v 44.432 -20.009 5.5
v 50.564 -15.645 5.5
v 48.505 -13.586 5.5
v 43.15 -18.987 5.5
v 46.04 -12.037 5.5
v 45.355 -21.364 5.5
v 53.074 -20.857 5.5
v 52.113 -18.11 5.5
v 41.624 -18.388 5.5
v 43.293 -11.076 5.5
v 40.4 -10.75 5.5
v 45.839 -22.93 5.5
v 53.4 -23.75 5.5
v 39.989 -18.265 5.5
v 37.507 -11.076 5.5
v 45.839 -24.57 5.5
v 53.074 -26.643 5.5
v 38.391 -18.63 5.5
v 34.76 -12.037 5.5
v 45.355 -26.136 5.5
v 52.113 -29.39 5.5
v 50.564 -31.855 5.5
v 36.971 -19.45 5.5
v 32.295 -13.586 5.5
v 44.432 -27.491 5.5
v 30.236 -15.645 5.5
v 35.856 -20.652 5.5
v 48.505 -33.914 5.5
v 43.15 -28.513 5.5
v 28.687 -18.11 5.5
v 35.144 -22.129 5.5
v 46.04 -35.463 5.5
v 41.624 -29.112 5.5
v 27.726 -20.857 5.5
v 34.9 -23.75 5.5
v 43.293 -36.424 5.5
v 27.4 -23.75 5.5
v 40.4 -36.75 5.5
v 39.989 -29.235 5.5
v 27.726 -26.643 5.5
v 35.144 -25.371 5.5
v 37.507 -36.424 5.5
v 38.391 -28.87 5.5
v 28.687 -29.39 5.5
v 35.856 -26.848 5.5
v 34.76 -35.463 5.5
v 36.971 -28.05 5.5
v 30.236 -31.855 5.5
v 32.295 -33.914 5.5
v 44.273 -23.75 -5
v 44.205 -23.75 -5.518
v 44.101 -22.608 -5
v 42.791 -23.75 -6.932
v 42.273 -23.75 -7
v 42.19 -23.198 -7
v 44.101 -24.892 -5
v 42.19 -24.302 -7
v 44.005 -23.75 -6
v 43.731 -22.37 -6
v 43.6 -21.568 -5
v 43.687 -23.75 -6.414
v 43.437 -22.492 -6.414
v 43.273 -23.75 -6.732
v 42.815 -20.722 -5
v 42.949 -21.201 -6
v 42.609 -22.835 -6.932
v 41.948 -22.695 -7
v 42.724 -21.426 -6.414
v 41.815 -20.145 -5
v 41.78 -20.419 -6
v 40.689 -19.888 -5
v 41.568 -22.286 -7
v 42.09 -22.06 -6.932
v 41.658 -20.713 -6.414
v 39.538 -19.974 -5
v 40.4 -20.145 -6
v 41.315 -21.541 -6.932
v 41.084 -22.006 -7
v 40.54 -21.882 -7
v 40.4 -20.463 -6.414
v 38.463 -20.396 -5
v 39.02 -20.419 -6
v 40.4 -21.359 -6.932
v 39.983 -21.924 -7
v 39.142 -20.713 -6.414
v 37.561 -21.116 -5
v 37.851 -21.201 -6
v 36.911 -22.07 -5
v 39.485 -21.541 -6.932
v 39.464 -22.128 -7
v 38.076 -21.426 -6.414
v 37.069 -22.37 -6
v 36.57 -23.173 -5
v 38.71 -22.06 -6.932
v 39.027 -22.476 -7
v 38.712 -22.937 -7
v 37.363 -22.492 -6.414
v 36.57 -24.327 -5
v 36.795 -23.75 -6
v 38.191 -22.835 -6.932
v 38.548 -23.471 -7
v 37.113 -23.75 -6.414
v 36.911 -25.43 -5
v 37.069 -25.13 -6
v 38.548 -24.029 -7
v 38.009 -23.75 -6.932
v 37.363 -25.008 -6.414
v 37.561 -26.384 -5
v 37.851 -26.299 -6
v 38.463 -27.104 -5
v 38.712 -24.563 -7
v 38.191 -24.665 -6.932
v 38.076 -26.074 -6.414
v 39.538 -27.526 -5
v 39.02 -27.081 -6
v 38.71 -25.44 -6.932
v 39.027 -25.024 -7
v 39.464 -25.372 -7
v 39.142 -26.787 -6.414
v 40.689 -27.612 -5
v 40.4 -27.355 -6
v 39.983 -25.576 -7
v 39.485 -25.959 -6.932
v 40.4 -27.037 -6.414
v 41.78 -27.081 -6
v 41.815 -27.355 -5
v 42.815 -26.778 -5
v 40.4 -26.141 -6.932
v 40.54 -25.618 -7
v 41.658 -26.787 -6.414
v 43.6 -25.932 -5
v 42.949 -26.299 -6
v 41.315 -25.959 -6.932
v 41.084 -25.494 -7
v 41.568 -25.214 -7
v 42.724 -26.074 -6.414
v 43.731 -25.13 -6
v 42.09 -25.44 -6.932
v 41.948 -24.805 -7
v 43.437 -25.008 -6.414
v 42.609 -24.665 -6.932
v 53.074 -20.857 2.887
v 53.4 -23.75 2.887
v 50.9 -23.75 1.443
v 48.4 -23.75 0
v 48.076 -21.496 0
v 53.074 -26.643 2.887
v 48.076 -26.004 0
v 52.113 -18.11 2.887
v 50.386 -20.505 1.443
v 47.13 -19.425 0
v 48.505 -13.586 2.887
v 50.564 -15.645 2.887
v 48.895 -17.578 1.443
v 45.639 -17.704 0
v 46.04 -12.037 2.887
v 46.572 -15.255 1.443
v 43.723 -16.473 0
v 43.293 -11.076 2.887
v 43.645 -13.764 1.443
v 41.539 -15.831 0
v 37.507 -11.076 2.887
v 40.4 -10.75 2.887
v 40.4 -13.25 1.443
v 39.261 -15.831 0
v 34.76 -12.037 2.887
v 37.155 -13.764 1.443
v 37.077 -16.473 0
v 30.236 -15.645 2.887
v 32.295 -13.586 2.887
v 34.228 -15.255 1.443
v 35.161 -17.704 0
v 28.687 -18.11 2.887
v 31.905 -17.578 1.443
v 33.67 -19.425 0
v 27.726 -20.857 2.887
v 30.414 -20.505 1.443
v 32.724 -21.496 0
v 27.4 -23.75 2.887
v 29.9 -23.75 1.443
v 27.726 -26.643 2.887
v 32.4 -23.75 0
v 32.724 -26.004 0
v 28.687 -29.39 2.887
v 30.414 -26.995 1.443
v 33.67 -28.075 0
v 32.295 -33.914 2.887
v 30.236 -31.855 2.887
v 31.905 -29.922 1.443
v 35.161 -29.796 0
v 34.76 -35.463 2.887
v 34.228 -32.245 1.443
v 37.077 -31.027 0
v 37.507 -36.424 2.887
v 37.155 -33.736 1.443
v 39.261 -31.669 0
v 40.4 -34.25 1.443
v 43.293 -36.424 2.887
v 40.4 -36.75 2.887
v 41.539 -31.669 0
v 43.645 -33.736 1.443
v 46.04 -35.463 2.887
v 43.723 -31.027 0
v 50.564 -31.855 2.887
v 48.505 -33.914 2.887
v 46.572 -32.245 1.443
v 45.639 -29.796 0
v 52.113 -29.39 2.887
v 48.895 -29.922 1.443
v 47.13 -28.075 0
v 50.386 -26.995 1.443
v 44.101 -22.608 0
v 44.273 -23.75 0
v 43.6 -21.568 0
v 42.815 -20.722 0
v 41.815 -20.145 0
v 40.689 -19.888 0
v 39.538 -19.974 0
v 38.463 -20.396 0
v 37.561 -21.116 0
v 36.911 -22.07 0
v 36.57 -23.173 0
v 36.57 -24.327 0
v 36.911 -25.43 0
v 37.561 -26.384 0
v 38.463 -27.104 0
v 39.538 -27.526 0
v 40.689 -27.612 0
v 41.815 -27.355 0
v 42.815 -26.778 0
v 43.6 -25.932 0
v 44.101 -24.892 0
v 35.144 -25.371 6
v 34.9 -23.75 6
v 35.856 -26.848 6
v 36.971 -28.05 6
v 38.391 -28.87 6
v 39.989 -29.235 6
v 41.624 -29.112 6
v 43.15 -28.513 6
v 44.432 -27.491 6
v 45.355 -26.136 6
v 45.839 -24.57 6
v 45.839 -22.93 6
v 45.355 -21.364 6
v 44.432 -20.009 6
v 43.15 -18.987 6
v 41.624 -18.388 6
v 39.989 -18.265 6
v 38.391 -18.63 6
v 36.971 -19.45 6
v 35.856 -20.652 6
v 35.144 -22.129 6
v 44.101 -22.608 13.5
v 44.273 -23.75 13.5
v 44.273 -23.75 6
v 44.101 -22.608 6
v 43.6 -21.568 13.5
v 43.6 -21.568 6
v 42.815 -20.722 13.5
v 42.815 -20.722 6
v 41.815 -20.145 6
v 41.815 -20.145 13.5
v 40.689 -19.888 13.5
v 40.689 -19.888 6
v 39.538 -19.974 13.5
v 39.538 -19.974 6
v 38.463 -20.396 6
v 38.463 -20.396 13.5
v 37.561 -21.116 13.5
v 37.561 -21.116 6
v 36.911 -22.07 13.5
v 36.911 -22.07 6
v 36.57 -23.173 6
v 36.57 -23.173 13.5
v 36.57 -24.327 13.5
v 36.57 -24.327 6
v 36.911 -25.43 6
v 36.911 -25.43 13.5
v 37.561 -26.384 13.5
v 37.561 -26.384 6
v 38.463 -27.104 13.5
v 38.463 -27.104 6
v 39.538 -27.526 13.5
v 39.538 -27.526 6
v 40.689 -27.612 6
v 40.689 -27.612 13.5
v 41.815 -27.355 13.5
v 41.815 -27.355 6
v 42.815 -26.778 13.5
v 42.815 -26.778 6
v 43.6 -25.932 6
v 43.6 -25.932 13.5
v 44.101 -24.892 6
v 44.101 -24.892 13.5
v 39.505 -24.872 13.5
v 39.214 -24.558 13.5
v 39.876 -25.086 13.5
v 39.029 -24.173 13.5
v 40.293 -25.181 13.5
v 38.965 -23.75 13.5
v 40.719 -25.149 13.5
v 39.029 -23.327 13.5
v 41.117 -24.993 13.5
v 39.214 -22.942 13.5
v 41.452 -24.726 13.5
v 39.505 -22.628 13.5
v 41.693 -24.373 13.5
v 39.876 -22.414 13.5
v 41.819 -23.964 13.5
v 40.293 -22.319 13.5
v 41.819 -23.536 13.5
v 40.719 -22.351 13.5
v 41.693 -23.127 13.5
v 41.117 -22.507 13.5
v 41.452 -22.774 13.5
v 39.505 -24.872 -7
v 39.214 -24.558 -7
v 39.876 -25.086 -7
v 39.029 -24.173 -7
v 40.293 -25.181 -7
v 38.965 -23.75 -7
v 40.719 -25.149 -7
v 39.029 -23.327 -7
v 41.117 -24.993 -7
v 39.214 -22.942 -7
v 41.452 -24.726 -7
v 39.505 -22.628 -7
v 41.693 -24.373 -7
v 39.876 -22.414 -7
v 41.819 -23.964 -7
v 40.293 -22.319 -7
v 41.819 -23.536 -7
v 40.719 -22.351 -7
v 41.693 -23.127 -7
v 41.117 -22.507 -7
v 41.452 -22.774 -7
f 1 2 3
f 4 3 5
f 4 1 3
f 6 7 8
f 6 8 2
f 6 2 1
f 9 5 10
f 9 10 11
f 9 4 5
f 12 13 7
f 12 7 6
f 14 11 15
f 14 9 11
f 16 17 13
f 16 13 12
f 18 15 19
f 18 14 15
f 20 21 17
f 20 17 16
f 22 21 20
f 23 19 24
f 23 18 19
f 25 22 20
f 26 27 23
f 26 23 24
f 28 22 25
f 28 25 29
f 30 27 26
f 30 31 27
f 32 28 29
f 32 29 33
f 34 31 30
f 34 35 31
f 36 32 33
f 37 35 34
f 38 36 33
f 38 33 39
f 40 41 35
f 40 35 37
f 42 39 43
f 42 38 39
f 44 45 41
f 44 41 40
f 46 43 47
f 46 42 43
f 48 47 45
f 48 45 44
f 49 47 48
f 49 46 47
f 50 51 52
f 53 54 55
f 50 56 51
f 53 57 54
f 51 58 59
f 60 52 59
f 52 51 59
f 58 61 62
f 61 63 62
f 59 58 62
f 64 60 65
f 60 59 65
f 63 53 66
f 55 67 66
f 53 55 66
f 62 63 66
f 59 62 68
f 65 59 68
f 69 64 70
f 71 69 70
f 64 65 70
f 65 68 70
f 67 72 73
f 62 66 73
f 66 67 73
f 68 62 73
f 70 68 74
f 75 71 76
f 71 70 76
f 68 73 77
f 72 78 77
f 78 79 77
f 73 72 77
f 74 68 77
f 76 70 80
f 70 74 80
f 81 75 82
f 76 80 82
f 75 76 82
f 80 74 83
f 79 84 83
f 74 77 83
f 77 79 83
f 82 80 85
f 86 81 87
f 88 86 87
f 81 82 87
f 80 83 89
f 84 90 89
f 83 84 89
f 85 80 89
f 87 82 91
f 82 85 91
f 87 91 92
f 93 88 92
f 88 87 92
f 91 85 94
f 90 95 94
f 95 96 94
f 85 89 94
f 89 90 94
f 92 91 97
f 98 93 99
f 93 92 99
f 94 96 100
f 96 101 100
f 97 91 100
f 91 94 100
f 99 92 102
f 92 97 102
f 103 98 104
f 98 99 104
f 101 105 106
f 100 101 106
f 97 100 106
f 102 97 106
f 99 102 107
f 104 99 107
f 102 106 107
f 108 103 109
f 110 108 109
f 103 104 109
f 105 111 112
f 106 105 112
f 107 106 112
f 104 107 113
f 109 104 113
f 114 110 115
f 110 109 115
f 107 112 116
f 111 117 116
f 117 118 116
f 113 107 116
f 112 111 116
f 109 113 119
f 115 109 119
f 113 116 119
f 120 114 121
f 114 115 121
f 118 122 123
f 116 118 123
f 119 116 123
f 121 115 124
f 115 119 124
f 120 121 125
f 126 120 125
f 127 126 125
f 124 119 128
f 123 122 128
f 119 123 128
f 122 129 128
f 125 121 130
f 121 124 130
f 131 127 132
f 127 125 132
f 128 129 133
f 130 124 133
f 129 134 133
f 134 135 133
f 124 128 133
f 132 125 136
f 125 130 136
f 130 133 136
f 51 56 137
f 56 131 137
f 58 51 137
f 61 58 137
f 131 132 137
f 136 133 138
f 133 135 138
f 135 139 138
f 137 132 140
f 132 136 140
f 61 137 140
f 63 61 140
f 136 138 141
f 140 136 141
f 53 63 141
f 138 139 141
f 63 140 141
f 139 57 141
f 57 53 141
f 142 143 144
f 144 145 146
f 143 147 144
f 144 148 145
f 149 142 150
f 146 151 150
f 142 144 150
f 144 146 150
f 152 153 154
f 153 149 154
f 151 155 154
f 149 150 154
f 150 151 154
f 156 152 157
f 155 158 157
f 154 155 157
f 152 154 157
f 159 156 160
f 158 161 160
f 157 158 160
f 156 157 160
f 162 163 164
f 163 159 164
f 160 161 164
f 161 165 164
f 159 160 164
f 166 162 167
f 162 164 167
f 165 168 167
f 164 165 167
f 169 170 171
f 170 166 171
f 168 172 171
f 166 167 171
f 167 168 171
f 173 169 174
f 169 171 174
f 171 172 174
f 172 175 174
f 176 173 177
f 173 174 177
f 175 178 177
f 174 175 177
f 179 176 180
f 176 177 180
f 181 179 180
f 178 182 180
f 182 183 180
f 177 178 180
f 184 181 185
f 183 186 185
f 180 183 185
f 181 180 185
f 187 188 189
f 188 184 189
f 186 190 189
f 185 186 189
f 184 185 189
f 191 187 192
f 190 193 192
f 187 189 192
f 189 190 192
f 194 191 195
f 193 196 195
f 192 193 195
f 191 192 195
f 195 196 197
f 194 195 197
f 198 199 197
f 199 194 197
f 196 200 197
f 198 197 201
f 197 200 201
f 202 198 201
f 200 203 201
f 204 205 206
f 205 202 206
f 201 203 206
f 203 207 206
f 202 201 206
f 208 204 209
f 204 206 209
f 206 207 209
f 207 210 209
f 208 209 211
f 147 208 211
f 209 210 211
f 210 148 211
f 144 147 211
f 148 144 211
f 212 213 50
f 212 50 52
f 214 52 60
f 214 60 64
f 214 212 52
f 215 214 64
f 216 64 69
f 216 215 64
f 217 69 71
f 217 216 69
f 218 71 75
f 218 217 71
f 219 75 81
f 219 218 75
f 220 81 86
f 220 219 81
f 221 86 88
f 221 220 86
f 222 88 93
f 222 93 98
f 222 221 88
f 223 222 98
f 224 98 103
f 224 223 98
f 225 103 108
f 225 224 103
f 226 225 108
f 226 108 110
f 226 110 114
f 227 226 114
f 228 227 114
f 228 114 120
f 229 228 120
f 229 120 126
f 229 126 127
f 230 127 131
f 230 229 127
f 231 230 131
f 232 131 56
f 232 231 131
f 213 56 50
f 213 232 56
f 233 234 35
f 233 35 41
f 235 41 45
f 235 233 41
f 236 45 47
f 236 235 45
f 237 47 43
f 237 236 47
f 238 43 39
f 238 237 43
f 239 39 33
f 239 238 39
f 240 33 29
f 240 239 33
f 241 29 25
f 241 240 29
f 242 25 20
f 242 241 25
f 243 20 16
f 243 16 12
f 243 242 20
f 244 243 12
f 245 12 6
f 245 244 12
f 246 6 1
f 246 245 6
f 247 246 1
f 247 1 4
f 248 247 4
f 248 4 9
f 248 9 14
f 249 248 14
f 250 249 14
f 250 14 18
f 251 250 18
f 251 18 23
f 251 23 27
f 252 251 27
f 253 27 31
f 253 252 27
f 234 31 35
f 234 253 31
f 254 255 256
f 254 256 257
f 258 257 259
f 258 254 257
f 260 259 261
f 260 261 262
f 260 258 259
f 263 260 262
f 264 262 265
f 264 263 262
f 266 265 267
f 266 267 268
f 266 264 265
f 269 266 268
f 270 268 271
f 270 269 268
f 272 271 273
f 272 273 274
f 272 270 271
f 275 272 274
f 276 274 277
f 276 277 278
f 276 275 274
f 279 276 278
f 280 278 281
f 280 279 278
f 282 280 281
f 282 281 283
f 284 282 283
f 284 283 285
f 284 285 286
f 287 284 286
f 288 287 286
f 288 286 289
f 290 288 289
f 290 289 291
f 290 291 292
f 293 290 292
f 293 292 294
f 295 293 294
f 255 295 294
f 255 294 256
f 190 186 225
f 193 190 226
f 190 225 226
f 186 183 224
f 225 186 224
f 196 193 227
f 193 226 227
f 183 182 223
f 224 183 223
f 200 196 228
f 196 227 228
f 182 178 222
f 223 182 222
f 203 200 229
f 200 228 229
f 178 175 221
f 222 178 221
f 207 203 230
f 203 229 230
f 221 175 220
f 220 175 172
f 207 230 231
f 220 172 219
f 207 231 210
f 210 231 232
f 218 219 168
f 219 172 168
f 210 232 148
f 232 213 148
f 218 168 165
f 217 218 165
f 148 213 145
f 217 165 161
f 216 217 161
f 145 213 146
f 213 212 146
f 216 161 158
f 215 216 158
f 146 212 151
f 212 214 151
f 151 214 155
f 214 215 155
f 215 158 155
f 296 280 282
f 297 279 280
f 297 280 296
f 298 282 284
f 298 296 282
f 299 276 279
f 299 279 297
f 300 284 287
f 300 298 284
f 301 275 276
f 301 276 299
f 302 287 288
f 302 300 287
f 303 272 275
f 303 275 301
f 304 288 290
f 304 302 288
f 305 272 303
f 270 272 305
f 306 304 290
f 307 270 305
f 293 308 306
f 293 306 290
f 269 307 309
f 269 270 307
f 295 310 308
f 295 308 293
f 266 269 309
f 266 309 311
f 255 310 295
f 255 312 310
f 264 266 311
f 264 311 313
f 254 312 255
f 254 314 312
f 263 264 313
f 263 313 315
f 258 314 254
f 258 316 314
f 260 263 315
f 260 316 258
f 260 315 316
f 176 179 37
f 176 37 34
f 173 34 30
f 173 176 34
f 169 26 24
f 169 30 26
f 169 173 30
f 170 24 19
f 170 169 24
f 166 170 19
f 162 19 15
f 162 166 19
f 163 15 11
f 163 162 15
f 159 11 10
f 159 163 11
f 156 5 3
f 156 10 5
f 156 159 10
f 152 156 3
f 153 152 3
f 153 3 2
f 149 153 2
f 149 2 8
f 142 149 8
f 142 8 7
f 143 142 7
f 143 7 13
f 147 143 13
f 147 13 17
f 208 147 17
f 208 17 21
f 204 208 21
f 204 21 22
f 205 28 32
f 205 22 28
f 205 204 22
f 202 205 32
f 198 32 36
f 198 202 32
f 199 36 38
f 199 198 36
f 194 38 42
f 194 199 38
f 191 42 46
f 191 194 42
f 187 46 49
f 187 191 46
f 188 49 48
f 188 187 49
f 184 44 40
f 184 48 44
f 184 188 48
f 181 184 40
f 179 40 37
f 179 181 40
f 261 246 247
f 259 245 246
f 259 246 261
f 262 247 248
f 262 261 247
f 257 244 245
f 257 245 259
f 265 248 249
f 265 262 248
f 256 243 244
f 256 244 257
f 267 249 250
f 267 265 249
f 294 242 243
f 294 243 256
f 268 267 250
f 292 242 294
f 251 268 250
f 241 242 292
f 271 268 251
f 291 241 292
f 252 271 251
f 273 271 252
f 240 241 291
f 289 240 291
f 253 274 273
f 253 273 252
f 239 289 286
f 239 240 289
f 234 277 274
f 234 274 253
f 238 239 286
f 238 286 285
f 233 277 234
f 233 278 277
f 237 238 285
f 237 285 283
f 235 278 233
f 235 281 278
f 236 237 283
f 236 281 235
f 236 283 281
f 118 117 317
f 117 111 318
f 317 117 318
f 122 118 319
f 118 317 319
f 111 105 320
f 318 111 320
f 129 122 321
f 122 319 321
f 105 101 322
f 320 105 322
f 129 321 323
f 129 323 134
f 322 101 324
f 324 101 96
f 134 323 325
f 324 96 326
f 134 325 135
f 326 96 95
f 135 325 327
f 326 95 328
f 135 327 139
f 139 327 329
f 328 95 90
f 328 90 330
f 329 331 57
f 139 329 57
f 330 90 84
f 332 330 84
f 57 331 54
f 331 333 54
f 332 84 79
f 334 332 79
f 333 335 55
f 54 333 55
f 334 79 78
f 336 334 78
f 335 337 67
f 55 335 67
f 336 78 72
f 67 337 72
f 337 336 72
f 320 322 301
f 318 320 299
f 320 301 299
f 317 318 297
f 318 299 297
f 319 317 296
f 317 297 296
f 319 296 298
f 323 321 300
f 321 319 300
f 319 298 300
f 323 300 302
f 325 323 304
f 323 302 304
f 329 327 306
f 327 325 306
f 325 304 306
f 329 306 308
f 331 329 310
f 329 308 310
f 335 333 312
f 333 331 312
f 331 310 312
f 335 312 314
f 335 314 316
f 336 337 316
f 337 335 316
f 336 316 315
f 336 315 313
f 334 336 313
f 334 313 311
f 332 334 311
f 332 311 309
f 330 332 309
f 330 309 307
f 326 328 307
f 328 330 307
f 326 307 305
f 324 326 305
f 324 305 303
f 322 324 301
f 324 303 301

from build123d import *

# Parameters (mm, degrees)
SKETCH1_R               = 3.873
BOSS_EXTRUDE1_DEPTH     = 7
FILLET1_R               = 2.000000064
BOSS_EXTRUDE2_START     = 3
SKETCH2_R               = 8
SKETCH2_R_2             = 3.873
BOSS_EXTRUDE2_DEPTH     = 3
SKETCH3_R               = 13
BOSS_EXTRUDE3_DEPTH     = 2.5
CHAMFER1_SIZE           = 5.196152423
CHAMFER1_SIZE_2         = 3
BOSS_EXTRUDE4_START     = 8
SKETCH4_R               = 3.873
SKETCH4_R_2             = 1.435
BOSS_EXTRUDE4_DEPTH     = 8
BOSS_EXTRUDE5_START     = 0.5
SKETCH4_3_R             = 5.5
SKETCH4_3_R_2           = 3.873
SKETCH4_3_R_3           = 1.435
BOSS_EXTRUDE5_DEPTH     = 0.5
CUT_EXTRUDE1_DEPTH      = 67.017971016
CUT_EXTRUDE1_DEPTH_BACK = 67.017971016
SKETCH6_R               = 1.435


with BuildPart() as part:
    # Sketch1 → Boss-Extrude1 (new body)
    with BuildSketch(Plane.XY):
        with Locations((40.399999972, -23.75)):
            Circle(SKETCH1_R)
    extrude(amount=-BOSS_EXTRUDE1_DEPTH)

    # Fillet1
    fillet1_edges = [part.edges().sort_by_distance(p)[0] for p in [
        (36.526999972, -23.75, -7),
    ]]
    fillet(fillet1_edges, radius=FILLET1_R)

    # Sketch2 → Boss-Extrude2 (add)
    # profile 1 of 2: a face of its own
    with BuildSketch(Plane.XY.offset(BOSS_EXTRUDE2_START)):
        with Locations((40.399999972, -23.75)):
            Circle(SKETCH2_R)
        with Locations((40.399999972, -23.75)):
            Circle(SKETCH2_R_2, mode=Mode.SUBTRACT)
    # profile 2 of 2: a face of its own
    with BuildSketch(Plane.XY.offset(BOSS_EXTRUDE2_START)):
        with Locations((40.399999972, -23.75)):
            Circle(SKETCH2_R_2)
    extrude(amount=-BOSS_EXTRUDE2_DEPTH)

    # Sketch3 → Boss-Extrude3 (add)
    with BuildSketch(Plane.XY.offset(3)):
        with Locations(Location((40.399999972, -23.75, 0), (0, 0, 180))):
            Circle(SKETCH3_R)
    extrude(amount=BOSS_EXTRUDE3_DEPTH)

    # Chamfer1
    # the kernel refuses this chamfer: 5.196152423, 3 mm, written as the material it adds along each edge
    with BuildSketch(Plane(origin=(40.399999972, -23.75, 3), x_dir=(1, 0, 0), z_dir=(0, -1, 0))) as chamfer1_piece_1_section:
        Polygon((8 + CHAMFER1_SIZE, 0), (8, -CHAMFER1_SIZE_2), (8, 0), align=None)
    chamfer1_piece_1 = revolve(axis=Axis((40.399999972, -23.75, 3), (0, 0, 1)), mode=Mode.PRIVATE)
    chamfer1_piece_1 = chamfer1_piece_1 & Plane(origin=(40.399999972, -23.75, 1.510979696), x_dir=(-1, 0, 0), z_dir=(0, 0, -1)) * Cylinder(13, 53, mode=Mode.PRIVATE)
    add(chamfer1_piece_1)

    # Sketch4 → Boss-Extrude4 (add)
    with BuildSketch(Plane.XY.offset(5.5).offset(BOSS_EXTRUDE4_START)):
        with Locations((40.399999972, -23.75)):
            Circle(SKETCH4_R)
        with Locations(Location((40.399999972, -23.75, 0), (0, 0, 180))):
            Circle(SKETCH4_R_2, mode=Mode.SUBTRACT)
    extrude(amount=-BOSS_EXTRUDE4_DEPTH)

    # Sketch4<3> → Boss-Extrude5 (add)
    # profile 1 of 2: a face of its own
    with BuildSketch(Plane.XY.offset(5.5).offset(BOSS_EXTRUDE5_START)):
        with Locations(Location((40.399999972, -23.75, 0), (0, 0, 180))):
            Circle(SKETCH4_3_R)
        with Locations((40.399999972, -23.75)):
            Circle(SKETCH4_3_R_2, mode=Mode.SUBTRACT)
    # profile 2 of 2: a face of its own
    with BuildSketch(Plane.XY.offset(5.5).offset(BOSS_EXTRUDE5_START)):
        with Locations((40.399999972, -23.75)):
            Circle(SKETCH4_3_R_2)
        with Locations(Location((40.399999972, -23.75, 0), (0, 0, 180))):
            Circle(SKETCH4_3_R_3, mode=Mode.SUBTRACT)
    extrude(amount=-BOSS_EXTRUDE5_DEPTH)

    # Sketch6 → Cut-Extrude1 (cut, two sides: drawn at the far end of the back side and taken through both)
    with BuildSketch(Plane.XY.offset(5.5).offset(-CUT_EXTRUDE1_DEPTH_BACK)):
        with Locations(Location((40.399999972, -23.75, 0), (0, 0, 180))):
            Circle(SKETCH6_R)
    extrude(amount=CUT_EXTRUDE1_DEPTH + CUT_EXTRUDE1_DEPTH_BACK, mode=Mode.SUBTRACT)


solid = part.part
